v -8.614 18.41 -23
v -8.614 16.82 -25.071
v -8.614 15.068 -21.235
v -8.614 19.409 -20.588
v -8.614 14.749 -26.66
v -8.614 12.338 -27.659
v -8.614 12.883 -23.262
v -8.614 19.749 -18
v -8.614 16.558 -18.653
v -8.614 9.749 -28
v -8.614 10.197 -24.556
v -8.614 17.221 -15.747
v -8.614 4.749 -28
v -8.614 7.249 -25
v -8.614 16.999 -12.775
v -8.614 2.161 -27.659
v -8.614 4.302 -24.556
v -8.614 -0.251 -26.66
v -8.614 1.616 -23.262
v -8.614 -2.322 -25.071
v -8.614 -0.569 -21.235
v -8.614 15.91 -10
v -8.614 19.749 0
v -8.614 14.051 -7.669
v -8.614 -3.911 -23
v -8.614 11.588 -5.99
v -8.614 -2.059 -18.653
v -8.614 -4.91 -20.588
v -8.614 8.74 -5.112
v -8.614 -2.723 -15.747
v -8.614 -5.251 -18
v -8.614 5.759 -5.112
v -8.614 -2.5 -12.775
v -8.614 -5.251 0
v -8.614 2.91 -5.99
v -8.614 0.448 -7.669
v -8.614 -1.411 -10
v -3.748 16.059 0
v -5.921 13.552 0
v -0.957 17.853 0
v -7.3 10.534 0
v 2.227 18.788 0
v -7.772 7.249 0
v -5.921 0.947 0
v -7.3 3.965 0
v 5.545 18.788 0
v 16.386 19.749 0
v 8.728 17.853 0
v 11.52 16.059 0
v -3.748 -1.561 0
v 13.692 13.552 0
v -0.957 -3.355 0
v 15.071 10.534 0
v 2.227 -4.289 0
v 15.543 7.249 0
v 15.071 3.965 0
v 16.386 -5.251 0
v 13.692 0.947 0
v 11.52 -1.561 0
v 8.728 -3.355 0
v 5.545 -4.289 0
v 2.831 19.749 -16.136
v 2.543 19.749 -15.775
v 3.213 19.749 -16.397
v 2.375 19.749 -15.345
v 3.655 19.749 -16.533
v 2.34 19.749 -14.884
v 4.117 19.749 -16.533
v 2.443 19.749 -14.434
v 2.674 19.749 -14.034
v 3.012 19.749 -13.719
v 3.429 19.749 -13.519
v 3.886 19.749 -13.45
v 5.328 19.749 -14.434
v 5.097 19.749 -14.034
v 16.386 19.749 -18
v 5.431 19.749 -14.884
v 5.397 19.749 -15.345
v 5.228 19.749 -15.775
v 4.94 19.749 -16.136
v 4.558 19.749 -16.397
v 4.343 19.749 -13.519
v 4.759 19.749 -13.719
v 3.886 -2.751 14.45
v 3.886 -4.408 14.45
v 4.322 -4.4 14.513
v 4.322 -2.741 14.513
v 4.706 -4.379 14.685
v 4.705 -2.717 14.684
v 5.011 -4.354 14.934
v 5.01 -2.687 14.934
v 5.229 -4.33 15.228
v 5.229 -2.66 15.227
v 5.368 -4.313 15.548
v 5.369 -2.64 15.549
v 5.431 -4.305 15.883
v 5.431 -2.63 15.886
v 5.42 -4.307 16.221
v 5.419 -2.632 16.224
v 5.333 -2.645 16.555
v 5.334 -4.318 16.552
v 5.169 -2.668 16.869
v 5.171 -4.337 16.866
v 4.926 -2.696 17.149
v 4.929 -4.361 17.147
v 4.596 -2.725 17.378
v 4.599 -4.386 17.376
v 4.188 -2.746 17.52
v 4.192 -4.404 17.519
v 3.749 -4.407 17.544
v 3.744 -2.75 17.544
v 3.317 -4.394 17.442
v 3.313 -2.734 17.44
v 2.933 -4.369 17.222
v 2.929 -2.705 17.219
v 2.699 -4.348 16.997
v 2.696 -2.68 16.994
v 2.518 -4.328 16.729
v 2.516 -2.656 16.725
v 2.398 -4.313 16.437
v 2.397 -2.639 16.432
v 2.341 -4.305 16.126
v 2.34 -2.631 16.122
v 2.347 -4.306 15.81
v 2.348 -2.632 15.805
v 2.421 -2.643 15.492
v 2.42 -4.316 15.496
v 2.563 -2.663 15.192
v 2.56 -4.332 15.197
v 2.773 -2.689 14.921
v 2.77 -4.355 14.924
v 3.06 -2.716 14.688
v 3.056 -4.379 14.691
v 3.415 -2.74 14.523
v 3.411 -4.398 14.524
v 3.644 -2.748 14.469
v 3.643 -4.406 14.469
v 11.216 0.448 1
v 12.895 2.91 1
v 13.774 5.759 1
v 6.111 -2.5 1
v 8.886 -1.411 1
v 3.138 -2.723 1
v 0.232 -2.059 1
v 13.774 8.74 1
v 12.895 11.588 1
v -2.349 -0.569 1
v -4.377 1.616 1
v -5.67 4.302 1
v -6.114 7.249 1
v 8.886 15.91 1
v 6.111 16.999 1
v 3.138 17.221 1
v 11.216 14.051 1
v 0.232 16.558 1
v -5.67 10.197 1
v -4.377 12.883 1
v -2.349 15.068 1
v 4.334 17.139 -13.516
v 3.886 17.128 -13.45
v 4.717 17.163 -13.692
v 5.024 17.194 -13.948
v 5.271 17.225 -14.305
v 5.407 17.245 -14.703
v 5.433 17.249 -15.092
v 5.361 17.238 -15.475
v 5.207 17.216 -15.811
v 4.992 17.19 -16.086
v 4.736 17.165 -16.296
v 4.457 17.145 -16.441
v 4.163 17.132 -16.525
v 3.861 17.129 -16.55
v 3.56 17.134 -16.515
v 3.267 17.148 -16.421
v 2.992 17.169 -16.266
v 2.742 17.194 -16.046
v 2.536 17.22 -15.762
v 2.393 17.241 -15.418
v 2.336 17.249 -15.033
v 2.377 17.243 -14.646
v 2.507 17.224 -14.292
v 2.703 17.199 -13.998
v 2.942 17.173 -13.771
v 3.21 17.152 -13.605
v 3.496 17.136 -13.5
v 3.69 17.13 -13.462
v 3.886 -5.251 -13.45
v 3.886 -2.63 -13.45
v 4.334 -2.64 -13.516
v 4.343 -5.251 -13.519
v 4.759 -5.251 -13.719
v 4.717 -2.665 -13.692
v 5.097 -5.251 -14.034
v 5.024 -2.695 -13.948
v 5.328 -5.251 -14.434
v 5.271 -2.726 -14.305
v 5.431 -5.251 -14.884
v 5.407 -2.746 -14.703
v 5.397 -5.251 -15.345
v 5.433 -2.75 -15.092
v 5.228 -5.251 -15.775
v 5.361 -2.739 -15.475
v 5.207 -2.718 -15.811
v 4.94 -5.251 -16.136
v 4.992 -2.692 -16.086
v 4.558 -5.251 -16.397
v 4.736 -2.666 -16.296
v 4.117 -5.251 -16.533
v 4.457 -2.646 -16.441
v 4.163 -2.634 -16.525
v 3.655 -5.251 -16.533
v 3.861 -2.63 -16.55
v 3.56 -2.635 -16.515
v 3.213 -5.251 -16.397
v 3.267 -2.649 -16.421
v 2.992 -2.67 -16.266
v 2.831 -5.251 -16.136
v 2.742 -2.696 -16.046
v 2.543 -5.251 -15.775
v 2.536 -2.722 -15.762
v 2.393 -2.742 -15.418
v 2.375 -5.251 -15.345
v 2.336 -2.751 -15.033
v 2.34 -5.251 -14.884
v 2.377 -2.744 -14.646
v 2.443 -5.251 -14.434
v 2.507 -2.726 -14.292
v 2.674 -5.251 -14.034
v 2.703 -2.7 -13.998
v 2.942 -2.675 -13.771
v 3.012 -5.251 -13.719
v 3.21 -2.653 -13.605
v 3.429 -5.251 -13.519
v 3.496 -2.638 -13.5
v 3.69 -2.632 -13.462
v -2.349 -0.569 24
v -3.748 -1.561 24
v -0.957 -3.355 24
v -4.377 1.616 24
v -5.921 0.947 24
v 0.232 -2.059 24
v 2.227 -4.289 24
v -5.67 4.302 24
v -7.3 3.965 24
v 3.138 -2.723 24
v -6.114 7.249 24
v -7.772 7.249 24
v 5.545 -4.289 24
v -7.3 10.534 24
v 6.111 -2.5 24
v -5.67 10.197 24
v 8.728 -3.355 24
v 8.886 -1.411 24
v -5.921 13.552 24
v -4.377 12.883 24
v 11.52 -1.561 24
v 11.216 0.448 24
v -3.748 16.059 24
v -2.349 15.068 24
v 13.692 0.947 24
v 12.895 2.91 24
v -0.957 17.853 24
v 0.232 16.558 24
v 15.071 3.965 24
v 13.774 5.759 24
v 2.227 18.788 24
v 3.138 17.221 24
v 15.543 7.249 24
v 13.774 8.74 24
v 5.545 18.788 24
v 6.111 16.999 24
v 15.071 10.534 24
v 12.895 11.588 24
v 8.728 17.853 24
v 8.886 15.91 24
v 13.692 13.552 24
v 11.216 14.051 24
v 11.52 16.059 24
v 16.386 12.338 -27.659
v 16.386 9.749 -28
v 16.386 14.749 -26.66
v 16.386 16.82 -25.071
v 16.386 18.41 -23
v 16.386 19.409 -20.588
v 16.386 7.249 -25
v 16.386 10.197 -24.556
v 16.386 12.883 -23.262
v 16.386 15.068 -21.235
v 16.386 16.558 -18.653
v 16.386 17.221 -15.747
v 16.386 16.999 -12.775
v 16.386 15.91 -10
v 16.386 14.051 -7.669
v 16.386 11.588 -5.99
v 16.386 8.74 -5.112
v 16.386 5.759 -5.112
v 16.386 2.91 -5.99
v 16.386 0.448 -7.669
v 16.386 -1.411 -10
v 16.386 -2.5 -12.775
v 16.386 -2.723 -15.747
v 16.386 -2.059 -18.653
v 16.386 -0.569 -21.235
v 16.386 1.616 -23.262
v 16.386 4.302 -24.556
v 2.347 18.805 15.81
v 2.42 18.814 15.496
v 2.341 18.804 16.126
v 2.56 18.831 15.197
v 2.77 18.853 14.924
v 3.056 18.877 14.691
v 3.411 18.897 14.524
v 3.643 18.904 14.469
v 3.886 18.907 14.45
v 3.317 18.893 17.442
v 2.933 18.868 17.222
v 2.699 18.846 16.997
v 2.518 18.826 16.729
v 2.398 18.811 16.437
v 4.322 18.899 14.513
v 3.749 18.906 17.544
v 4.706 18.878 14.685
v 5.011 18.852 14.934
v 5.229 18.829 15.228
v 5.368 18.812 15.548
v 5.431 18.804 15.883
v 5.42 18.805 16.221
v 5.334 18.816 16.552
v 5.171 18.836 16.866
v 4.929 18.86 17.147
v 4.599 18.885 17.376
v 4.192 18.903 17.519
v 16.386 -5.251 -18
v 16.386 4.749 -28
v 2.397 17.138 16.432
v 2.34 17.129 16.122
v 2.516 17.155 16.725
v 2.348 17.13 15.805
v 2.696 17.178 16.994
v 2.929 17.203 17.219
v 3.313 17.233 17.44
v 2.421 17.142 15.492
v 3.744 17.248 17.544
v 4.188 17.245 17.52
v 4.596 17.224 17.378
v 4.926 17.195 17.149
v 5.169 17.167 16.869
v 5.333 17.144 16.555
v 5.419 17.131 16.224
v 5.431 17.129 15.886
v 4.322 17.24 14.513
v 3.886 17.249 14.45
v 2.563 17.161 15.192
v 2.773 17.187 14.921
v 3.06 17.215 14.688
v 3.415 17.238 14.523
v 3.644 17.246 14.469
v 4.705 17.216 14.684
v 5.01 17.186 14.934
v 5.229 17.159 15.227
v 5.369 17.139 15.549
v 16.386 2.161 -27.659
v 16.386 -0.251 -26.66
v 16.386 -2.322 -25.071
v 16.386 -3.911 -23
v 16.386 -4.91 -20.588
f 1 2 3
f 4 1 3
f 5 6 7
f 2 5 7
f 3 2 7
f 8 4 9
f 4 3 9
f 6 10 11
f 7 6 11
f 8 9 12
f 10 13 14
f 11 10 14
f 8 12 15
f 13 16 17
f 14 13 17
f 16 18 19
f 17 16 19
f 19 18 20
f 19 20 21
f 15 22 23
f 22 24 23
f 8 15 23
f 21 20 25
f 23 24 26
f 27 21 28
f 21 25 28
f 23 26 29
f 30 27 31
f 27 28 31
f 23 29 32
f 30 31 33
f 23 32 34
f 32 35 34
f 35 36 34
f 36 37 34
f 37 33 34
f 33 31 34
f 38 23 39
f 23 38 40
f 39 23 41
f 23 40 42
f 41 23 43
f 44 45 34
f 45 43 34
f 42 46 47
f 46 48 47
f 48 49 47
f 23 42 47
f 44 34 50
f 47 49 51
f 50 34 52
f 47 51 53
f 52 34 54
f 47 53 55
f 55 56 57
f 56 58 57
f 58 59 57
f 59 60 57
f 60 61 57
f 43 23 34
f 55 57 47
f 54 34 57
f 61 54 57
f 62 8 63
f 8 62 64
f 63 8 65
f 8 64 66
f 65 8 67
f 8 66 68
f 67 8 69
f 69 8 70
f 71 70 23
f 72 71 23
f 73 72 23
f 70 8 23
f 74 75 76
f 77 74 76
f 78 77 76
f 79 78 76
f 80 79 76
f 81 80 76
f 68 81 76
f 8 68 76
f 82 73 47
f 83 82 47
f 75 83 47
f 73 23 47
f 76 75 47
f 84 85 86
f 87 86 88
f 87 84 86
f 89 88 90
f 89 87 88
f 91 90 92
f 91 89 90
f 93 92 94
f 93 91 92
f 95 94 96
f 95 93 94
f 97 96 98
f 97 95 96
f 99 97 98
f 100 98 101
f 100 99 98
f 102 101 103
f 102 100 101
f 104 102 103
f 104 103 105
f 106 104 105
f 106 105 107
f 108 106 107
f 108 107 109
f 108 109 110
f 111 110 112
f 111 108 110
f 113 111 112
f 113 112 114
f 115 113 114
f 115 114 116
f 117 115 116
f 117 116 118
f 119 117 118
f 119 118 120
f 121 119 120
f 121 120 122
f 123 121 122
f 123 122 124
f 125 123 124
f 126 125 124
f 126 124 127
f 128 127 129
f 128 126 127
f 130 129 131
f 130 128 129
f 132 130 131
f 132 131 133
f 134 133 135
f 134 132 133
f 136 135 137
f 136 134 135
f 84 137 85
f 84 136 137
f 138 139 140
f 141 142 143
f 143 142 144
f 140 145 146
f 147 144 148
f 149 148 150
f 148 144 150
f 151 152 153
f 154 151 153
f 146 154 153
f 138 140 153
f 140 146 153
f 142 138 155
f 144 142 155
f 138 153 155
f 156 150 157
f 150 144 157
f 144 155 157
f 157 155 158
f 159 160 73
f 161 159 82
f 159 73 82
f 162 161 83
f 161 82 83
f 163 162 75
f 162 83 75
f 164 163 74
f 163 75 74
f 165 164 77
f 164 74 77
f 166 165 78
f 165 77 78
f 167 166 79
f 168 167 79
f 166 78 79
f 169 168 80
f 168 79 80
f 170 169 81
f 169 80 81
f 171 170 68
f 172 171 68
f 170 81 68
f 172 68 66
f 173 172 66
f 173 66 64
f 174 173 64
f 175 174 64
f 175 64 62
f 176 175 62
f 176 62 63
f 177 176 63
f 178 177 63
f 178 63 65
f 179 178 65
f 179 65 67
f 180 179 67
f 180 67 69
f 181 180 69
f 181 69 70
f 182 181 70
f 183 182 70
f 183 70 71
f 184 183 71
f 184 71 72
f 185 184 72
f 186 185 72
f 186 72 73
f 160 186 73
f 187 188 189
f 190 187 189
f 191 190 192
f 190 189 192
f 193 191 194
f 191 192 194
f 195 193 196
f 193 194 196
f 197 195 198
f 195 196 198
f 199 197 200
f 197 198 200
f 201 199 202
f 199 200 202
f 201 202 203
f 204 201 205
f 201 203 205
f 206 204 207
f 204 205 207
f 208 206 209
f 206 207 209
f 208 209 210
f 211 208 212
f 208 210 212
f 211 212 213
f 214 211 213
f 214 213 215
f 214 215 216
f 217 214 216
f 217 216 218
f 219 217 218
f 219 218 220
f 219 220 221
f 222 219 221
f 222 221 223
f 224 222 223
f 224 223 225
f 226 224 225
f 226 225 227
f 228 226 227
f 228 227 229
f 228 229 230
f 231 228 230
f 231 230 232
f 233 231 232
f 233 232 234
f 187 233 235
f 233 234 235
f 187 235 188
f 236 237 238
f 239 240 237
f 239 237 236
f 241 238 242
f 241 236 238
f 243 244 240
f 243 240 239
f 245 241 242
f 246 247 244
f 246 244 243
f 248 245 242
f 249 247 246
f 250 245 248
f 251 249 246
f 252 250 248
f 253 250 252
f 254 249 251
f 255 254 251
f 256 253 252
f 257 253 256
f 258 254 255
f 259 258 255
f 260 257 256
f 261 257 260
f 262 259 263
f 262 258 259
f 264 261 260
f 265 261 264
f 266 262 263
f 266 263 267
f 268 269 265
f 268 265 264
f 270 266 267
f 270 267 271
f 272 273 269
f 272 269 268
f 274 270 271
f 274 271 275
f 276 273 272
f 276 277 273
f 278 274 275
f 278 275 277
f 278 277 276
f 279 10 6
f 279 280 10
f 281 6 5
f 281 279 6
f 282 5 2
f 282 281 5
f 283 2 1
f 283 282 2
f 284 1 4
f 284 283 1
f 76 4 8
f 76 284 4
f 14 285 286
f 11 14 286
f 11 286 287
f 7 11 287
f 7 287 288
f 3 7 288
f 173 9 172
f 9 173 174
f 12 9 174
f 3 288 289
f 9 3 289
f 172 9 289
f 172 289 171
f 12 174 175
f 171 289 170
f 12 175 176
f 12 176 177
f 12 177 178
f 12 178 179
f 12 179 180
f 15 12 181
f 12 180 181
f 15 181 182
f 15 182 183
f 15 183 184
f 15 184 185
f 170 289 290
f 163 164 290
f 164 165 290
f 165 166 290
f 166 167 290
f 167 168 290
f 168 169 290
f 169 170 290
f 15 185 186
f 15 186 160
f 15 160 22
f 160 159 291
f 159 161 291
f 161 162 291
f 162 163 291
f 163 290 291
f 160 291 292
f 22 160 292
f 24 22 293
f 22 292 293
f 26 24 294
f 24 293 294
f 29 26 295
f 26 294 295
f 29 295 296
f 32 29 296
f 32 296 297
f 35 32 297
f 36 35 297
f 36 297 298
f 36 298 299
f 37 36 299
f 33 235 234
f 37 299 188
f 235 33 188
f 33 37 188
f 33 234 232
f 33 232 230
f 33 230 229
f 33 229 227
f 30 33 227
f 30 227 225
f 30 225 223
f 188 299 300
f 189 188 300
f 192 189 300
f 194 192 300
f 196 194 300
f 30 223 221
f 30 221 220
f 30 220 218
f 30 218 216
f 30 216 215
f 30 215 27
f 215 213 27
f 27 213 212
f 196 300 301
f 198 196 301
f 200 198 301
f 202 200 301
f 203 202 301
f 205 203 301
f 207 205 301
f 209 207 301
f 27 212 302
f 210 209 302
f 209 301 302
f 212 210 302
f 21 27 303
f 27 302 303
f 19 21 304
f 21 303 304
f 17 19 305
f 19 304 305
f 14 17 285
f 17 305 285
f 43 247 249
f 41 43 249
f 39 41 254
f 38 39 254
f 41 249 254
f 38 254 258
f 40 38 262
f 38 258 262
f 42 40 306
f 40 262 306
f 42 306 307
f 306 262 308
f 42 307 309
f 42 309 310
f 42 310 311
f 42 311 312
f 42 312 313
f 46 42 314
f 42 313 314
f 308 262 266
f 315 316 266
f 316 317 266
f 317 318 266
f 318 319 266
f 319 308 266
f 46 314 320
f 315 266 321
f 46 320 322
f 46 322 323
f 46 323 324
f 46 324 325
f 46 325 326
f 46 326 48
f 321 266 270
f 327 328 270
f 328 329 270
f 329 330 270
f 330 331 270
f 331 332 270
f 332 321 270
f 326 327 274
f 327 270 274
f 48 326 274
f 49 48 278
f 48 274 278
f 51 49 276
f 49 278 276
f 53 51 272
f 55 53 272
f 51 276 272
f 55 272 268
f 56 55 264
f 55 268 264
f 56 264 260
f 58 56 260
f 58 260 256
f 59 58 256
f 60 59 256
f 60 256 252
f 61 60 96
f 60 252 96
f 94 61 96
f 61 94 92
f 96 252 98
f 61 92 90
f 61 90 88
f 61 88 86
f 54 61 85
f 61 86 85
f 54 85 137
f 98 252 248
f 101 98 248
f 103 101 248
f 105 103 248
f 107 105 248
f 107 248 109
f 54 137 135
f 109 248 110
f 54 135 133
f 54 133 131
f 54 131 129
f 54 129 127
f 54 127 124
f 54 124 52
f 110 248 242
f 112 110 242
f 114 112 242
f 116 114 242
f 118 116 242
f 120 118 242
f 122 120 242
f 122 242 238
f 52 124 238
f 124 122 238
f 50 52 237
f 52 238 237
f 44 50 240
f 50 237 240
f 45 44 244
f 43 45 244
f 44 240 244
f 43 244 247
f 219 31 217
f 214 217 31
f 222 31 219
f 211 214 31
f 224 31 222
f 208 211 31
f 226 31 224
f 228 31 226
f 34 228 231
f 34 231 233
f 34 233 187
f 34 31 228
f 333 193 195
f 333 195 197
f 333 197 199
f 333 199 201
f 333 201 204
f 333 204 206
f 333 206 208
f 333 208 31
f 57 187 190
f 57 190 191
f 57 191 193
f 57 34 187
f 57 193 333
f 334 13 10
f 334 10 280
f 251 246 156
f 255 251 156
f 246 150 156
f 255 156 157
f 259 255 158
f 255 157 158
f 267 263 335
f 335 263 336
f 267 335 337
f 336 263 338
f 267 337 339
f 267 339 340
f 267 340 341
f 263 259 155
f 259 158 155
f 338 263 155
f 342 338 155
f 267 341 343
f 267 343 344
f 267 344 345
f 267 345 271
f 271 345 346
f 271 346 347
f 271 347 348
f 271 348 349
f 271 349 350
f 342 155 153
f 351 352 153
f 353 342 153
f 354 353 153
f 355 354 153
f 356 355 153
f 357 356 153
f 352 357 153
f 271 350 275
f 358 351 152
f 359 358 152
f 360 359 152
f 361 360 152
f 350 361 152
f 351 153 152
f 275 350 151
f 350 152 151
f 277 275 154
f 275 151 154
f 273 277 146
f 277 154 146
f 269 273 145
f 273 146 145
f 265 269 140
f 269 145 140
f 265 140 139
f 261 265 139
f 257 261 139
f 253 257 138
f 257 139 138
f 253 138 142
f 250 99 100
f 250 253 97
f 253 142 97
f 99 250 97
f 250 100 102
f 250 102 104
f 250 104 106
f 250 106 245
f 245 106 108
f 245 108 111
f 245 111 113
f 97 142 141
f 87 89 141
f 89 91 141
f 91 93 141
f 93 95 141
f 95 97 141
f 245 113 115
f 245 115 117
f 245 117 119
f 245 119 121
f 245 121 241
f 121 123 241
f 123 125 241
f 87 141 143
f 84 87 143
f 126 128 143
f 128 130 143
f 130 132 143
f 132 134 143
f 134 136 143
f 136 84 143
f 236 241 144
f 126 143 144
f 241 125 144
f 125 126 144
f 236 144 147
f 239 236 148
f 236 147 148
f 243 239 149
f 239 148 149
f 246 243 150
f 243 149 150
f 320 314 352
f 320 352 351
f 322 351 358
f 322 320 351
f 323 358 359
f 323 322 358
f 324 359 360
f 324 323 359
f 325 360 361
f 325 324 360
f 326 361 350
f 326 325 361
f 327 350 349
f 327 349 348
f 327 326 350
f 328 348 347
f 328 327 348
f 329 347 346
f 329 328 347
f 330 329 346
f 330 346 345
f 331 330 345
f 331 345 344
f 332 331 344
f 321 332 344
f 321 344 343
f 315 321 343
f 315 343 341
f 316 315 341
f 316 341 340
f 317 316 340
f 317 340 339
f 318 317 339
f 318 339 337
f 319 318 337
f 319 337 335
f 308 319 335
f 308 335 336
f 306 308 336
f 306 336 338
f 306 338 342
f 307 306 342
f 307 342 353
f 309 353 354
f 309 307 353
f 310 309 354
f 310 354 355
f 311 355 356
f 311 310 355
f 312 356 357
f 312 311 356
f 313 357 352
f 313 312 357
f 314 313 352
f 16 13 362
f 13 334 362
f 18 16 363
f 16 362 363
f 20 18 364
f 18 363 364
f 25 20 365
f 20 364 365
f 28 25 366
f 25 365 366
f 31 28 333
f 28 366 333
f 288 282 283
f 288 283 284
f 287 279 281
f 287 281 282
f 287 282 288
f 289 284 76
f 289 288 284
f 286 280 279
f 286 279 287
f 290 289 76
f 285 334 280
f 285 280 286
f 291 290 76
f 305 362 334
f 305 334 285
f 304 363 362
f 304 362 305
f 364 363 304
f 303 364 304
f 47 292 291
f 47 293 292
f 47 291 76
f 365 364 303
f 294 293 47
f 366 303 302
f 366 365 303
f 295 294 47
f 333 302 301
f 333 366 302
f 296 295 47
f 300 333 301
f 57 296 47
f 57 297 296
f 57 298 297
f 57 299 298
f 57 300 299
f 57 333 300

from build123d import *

# Parameters (mm, degrees)
SKETCH_1_W                  = 25
SKETCH_1_H                  = 28
EXTRUDE_1_DEPTH             = 25
SKETCH_2_W                  = 11.657397777
SKETCH_2_H                  = 24
HOLE_WIZARD_20_0_20_1_D     = 20
HOLE_WIZARD_20_0_20_2_D     = 20
HOLE_WIZARD_20_0_20_2_DEPTH = 23
FILLET_1_R                  = 10
CUT_EXTRUDE_1_DEPTH         = 35.766927543
CUT_EXTRUDE_1_DEPTH_BACK    = 35.766927543
SKETCH_7_R                  = 1.55
SKETCH_9_R                  = 1.55
CUT_EXTRUDE_2_DEPTH         = 41.957163608


with BuildPart() as part:
    # 草图1 → 凸台-拉伸1 (new body)
    with BuildSketch(Plane.XZ.offset(5.250668647)):
        with Locations((3.885641605, -14)):
            Rectangle(SKETCH_1_W, SKETCH_1_H)
    extrude(amount=-EXTRUDE_1_DEPTH)

    # 草图2 → 旋转1 (revolve)
    with BuildSketch(Plane.XZ.offset(-7.249331353), mode=Mode.PRIVATE) as revolve_1_sk:
        with Locations((9.714340494, 12)):
            Rectangle(SKETCH_2_W, SKETCH_2_H)
    revolve(revolve_1_sk.sketch.rotate(Axis((3.885641605, 7.249331353, 24), (0, 0, -1)), 180), axis=Axis((3.885641605, 7.249331353, 24), (0, 0, -1)))

    # Ø20.0 (20) 直径孔1 (through all)
    with Locations(Plane.ZY.offset(8.614358395)):
        with Locations((-15, 7.249331353)):
            Hole(HOLE_WIZARD_20_0_20_1_D / 2)

    # Ø20.0 (20) 直径孔2
    with Locations(Plane.XY.offset(24)):
        with Locations((3.885641605, 7.249331353)):
            Hole(HOLE_WIZARD_20_0_20_2_D / 2, depth=HOLE_WIZARD_20_0_20_2_DEPTH)

    # 圆角1
    fillet_1_edges = [part.edges().sort_by_distance(p)[0] for p in [
        (3.885641605, 19.749331353, -28),
        (3.885641605, -5.250668647, -28),
    ]]
    fillet(fillet_1_edges, radius=FILLET_1_R)

    # 草图7 → 切除-拉伸1 (cut, two sides: drawn at the far end of the back side and taken through both)
    with BuildSketch(Plane.XZ.offset(-7.249331353).offset(-CUT_EXTRUDE_1_DEPTH_BACK)):
        with Locations(Location((3.885641605, 16, 0), (0, 0, 270))):
            Circle(SKETCH_7_R)
    extrude(amount=CUT_EXTRUDE_1_DEPTH + CUT_EXTRUDE_1_DEPTH_BACK, mode=Mode.SUBTRACT)

    # 草图9 → 切除-拉伸2 (cut, through all)
    with BuildSketch(Plane(origin=(0, 19.749331353, 0), x_dir=(1, 0, 0), z_dir=(0, 1, 0))):
        with Locations(Location((3.885641605, 15, 0), (0, 0, 270))):
            Circle(SKETCH_9_R)
    extrude(amount=-CUT_EXTRUDE_2_DEPTH, mode=Mode.SUBTRACT)


solid = part.part
